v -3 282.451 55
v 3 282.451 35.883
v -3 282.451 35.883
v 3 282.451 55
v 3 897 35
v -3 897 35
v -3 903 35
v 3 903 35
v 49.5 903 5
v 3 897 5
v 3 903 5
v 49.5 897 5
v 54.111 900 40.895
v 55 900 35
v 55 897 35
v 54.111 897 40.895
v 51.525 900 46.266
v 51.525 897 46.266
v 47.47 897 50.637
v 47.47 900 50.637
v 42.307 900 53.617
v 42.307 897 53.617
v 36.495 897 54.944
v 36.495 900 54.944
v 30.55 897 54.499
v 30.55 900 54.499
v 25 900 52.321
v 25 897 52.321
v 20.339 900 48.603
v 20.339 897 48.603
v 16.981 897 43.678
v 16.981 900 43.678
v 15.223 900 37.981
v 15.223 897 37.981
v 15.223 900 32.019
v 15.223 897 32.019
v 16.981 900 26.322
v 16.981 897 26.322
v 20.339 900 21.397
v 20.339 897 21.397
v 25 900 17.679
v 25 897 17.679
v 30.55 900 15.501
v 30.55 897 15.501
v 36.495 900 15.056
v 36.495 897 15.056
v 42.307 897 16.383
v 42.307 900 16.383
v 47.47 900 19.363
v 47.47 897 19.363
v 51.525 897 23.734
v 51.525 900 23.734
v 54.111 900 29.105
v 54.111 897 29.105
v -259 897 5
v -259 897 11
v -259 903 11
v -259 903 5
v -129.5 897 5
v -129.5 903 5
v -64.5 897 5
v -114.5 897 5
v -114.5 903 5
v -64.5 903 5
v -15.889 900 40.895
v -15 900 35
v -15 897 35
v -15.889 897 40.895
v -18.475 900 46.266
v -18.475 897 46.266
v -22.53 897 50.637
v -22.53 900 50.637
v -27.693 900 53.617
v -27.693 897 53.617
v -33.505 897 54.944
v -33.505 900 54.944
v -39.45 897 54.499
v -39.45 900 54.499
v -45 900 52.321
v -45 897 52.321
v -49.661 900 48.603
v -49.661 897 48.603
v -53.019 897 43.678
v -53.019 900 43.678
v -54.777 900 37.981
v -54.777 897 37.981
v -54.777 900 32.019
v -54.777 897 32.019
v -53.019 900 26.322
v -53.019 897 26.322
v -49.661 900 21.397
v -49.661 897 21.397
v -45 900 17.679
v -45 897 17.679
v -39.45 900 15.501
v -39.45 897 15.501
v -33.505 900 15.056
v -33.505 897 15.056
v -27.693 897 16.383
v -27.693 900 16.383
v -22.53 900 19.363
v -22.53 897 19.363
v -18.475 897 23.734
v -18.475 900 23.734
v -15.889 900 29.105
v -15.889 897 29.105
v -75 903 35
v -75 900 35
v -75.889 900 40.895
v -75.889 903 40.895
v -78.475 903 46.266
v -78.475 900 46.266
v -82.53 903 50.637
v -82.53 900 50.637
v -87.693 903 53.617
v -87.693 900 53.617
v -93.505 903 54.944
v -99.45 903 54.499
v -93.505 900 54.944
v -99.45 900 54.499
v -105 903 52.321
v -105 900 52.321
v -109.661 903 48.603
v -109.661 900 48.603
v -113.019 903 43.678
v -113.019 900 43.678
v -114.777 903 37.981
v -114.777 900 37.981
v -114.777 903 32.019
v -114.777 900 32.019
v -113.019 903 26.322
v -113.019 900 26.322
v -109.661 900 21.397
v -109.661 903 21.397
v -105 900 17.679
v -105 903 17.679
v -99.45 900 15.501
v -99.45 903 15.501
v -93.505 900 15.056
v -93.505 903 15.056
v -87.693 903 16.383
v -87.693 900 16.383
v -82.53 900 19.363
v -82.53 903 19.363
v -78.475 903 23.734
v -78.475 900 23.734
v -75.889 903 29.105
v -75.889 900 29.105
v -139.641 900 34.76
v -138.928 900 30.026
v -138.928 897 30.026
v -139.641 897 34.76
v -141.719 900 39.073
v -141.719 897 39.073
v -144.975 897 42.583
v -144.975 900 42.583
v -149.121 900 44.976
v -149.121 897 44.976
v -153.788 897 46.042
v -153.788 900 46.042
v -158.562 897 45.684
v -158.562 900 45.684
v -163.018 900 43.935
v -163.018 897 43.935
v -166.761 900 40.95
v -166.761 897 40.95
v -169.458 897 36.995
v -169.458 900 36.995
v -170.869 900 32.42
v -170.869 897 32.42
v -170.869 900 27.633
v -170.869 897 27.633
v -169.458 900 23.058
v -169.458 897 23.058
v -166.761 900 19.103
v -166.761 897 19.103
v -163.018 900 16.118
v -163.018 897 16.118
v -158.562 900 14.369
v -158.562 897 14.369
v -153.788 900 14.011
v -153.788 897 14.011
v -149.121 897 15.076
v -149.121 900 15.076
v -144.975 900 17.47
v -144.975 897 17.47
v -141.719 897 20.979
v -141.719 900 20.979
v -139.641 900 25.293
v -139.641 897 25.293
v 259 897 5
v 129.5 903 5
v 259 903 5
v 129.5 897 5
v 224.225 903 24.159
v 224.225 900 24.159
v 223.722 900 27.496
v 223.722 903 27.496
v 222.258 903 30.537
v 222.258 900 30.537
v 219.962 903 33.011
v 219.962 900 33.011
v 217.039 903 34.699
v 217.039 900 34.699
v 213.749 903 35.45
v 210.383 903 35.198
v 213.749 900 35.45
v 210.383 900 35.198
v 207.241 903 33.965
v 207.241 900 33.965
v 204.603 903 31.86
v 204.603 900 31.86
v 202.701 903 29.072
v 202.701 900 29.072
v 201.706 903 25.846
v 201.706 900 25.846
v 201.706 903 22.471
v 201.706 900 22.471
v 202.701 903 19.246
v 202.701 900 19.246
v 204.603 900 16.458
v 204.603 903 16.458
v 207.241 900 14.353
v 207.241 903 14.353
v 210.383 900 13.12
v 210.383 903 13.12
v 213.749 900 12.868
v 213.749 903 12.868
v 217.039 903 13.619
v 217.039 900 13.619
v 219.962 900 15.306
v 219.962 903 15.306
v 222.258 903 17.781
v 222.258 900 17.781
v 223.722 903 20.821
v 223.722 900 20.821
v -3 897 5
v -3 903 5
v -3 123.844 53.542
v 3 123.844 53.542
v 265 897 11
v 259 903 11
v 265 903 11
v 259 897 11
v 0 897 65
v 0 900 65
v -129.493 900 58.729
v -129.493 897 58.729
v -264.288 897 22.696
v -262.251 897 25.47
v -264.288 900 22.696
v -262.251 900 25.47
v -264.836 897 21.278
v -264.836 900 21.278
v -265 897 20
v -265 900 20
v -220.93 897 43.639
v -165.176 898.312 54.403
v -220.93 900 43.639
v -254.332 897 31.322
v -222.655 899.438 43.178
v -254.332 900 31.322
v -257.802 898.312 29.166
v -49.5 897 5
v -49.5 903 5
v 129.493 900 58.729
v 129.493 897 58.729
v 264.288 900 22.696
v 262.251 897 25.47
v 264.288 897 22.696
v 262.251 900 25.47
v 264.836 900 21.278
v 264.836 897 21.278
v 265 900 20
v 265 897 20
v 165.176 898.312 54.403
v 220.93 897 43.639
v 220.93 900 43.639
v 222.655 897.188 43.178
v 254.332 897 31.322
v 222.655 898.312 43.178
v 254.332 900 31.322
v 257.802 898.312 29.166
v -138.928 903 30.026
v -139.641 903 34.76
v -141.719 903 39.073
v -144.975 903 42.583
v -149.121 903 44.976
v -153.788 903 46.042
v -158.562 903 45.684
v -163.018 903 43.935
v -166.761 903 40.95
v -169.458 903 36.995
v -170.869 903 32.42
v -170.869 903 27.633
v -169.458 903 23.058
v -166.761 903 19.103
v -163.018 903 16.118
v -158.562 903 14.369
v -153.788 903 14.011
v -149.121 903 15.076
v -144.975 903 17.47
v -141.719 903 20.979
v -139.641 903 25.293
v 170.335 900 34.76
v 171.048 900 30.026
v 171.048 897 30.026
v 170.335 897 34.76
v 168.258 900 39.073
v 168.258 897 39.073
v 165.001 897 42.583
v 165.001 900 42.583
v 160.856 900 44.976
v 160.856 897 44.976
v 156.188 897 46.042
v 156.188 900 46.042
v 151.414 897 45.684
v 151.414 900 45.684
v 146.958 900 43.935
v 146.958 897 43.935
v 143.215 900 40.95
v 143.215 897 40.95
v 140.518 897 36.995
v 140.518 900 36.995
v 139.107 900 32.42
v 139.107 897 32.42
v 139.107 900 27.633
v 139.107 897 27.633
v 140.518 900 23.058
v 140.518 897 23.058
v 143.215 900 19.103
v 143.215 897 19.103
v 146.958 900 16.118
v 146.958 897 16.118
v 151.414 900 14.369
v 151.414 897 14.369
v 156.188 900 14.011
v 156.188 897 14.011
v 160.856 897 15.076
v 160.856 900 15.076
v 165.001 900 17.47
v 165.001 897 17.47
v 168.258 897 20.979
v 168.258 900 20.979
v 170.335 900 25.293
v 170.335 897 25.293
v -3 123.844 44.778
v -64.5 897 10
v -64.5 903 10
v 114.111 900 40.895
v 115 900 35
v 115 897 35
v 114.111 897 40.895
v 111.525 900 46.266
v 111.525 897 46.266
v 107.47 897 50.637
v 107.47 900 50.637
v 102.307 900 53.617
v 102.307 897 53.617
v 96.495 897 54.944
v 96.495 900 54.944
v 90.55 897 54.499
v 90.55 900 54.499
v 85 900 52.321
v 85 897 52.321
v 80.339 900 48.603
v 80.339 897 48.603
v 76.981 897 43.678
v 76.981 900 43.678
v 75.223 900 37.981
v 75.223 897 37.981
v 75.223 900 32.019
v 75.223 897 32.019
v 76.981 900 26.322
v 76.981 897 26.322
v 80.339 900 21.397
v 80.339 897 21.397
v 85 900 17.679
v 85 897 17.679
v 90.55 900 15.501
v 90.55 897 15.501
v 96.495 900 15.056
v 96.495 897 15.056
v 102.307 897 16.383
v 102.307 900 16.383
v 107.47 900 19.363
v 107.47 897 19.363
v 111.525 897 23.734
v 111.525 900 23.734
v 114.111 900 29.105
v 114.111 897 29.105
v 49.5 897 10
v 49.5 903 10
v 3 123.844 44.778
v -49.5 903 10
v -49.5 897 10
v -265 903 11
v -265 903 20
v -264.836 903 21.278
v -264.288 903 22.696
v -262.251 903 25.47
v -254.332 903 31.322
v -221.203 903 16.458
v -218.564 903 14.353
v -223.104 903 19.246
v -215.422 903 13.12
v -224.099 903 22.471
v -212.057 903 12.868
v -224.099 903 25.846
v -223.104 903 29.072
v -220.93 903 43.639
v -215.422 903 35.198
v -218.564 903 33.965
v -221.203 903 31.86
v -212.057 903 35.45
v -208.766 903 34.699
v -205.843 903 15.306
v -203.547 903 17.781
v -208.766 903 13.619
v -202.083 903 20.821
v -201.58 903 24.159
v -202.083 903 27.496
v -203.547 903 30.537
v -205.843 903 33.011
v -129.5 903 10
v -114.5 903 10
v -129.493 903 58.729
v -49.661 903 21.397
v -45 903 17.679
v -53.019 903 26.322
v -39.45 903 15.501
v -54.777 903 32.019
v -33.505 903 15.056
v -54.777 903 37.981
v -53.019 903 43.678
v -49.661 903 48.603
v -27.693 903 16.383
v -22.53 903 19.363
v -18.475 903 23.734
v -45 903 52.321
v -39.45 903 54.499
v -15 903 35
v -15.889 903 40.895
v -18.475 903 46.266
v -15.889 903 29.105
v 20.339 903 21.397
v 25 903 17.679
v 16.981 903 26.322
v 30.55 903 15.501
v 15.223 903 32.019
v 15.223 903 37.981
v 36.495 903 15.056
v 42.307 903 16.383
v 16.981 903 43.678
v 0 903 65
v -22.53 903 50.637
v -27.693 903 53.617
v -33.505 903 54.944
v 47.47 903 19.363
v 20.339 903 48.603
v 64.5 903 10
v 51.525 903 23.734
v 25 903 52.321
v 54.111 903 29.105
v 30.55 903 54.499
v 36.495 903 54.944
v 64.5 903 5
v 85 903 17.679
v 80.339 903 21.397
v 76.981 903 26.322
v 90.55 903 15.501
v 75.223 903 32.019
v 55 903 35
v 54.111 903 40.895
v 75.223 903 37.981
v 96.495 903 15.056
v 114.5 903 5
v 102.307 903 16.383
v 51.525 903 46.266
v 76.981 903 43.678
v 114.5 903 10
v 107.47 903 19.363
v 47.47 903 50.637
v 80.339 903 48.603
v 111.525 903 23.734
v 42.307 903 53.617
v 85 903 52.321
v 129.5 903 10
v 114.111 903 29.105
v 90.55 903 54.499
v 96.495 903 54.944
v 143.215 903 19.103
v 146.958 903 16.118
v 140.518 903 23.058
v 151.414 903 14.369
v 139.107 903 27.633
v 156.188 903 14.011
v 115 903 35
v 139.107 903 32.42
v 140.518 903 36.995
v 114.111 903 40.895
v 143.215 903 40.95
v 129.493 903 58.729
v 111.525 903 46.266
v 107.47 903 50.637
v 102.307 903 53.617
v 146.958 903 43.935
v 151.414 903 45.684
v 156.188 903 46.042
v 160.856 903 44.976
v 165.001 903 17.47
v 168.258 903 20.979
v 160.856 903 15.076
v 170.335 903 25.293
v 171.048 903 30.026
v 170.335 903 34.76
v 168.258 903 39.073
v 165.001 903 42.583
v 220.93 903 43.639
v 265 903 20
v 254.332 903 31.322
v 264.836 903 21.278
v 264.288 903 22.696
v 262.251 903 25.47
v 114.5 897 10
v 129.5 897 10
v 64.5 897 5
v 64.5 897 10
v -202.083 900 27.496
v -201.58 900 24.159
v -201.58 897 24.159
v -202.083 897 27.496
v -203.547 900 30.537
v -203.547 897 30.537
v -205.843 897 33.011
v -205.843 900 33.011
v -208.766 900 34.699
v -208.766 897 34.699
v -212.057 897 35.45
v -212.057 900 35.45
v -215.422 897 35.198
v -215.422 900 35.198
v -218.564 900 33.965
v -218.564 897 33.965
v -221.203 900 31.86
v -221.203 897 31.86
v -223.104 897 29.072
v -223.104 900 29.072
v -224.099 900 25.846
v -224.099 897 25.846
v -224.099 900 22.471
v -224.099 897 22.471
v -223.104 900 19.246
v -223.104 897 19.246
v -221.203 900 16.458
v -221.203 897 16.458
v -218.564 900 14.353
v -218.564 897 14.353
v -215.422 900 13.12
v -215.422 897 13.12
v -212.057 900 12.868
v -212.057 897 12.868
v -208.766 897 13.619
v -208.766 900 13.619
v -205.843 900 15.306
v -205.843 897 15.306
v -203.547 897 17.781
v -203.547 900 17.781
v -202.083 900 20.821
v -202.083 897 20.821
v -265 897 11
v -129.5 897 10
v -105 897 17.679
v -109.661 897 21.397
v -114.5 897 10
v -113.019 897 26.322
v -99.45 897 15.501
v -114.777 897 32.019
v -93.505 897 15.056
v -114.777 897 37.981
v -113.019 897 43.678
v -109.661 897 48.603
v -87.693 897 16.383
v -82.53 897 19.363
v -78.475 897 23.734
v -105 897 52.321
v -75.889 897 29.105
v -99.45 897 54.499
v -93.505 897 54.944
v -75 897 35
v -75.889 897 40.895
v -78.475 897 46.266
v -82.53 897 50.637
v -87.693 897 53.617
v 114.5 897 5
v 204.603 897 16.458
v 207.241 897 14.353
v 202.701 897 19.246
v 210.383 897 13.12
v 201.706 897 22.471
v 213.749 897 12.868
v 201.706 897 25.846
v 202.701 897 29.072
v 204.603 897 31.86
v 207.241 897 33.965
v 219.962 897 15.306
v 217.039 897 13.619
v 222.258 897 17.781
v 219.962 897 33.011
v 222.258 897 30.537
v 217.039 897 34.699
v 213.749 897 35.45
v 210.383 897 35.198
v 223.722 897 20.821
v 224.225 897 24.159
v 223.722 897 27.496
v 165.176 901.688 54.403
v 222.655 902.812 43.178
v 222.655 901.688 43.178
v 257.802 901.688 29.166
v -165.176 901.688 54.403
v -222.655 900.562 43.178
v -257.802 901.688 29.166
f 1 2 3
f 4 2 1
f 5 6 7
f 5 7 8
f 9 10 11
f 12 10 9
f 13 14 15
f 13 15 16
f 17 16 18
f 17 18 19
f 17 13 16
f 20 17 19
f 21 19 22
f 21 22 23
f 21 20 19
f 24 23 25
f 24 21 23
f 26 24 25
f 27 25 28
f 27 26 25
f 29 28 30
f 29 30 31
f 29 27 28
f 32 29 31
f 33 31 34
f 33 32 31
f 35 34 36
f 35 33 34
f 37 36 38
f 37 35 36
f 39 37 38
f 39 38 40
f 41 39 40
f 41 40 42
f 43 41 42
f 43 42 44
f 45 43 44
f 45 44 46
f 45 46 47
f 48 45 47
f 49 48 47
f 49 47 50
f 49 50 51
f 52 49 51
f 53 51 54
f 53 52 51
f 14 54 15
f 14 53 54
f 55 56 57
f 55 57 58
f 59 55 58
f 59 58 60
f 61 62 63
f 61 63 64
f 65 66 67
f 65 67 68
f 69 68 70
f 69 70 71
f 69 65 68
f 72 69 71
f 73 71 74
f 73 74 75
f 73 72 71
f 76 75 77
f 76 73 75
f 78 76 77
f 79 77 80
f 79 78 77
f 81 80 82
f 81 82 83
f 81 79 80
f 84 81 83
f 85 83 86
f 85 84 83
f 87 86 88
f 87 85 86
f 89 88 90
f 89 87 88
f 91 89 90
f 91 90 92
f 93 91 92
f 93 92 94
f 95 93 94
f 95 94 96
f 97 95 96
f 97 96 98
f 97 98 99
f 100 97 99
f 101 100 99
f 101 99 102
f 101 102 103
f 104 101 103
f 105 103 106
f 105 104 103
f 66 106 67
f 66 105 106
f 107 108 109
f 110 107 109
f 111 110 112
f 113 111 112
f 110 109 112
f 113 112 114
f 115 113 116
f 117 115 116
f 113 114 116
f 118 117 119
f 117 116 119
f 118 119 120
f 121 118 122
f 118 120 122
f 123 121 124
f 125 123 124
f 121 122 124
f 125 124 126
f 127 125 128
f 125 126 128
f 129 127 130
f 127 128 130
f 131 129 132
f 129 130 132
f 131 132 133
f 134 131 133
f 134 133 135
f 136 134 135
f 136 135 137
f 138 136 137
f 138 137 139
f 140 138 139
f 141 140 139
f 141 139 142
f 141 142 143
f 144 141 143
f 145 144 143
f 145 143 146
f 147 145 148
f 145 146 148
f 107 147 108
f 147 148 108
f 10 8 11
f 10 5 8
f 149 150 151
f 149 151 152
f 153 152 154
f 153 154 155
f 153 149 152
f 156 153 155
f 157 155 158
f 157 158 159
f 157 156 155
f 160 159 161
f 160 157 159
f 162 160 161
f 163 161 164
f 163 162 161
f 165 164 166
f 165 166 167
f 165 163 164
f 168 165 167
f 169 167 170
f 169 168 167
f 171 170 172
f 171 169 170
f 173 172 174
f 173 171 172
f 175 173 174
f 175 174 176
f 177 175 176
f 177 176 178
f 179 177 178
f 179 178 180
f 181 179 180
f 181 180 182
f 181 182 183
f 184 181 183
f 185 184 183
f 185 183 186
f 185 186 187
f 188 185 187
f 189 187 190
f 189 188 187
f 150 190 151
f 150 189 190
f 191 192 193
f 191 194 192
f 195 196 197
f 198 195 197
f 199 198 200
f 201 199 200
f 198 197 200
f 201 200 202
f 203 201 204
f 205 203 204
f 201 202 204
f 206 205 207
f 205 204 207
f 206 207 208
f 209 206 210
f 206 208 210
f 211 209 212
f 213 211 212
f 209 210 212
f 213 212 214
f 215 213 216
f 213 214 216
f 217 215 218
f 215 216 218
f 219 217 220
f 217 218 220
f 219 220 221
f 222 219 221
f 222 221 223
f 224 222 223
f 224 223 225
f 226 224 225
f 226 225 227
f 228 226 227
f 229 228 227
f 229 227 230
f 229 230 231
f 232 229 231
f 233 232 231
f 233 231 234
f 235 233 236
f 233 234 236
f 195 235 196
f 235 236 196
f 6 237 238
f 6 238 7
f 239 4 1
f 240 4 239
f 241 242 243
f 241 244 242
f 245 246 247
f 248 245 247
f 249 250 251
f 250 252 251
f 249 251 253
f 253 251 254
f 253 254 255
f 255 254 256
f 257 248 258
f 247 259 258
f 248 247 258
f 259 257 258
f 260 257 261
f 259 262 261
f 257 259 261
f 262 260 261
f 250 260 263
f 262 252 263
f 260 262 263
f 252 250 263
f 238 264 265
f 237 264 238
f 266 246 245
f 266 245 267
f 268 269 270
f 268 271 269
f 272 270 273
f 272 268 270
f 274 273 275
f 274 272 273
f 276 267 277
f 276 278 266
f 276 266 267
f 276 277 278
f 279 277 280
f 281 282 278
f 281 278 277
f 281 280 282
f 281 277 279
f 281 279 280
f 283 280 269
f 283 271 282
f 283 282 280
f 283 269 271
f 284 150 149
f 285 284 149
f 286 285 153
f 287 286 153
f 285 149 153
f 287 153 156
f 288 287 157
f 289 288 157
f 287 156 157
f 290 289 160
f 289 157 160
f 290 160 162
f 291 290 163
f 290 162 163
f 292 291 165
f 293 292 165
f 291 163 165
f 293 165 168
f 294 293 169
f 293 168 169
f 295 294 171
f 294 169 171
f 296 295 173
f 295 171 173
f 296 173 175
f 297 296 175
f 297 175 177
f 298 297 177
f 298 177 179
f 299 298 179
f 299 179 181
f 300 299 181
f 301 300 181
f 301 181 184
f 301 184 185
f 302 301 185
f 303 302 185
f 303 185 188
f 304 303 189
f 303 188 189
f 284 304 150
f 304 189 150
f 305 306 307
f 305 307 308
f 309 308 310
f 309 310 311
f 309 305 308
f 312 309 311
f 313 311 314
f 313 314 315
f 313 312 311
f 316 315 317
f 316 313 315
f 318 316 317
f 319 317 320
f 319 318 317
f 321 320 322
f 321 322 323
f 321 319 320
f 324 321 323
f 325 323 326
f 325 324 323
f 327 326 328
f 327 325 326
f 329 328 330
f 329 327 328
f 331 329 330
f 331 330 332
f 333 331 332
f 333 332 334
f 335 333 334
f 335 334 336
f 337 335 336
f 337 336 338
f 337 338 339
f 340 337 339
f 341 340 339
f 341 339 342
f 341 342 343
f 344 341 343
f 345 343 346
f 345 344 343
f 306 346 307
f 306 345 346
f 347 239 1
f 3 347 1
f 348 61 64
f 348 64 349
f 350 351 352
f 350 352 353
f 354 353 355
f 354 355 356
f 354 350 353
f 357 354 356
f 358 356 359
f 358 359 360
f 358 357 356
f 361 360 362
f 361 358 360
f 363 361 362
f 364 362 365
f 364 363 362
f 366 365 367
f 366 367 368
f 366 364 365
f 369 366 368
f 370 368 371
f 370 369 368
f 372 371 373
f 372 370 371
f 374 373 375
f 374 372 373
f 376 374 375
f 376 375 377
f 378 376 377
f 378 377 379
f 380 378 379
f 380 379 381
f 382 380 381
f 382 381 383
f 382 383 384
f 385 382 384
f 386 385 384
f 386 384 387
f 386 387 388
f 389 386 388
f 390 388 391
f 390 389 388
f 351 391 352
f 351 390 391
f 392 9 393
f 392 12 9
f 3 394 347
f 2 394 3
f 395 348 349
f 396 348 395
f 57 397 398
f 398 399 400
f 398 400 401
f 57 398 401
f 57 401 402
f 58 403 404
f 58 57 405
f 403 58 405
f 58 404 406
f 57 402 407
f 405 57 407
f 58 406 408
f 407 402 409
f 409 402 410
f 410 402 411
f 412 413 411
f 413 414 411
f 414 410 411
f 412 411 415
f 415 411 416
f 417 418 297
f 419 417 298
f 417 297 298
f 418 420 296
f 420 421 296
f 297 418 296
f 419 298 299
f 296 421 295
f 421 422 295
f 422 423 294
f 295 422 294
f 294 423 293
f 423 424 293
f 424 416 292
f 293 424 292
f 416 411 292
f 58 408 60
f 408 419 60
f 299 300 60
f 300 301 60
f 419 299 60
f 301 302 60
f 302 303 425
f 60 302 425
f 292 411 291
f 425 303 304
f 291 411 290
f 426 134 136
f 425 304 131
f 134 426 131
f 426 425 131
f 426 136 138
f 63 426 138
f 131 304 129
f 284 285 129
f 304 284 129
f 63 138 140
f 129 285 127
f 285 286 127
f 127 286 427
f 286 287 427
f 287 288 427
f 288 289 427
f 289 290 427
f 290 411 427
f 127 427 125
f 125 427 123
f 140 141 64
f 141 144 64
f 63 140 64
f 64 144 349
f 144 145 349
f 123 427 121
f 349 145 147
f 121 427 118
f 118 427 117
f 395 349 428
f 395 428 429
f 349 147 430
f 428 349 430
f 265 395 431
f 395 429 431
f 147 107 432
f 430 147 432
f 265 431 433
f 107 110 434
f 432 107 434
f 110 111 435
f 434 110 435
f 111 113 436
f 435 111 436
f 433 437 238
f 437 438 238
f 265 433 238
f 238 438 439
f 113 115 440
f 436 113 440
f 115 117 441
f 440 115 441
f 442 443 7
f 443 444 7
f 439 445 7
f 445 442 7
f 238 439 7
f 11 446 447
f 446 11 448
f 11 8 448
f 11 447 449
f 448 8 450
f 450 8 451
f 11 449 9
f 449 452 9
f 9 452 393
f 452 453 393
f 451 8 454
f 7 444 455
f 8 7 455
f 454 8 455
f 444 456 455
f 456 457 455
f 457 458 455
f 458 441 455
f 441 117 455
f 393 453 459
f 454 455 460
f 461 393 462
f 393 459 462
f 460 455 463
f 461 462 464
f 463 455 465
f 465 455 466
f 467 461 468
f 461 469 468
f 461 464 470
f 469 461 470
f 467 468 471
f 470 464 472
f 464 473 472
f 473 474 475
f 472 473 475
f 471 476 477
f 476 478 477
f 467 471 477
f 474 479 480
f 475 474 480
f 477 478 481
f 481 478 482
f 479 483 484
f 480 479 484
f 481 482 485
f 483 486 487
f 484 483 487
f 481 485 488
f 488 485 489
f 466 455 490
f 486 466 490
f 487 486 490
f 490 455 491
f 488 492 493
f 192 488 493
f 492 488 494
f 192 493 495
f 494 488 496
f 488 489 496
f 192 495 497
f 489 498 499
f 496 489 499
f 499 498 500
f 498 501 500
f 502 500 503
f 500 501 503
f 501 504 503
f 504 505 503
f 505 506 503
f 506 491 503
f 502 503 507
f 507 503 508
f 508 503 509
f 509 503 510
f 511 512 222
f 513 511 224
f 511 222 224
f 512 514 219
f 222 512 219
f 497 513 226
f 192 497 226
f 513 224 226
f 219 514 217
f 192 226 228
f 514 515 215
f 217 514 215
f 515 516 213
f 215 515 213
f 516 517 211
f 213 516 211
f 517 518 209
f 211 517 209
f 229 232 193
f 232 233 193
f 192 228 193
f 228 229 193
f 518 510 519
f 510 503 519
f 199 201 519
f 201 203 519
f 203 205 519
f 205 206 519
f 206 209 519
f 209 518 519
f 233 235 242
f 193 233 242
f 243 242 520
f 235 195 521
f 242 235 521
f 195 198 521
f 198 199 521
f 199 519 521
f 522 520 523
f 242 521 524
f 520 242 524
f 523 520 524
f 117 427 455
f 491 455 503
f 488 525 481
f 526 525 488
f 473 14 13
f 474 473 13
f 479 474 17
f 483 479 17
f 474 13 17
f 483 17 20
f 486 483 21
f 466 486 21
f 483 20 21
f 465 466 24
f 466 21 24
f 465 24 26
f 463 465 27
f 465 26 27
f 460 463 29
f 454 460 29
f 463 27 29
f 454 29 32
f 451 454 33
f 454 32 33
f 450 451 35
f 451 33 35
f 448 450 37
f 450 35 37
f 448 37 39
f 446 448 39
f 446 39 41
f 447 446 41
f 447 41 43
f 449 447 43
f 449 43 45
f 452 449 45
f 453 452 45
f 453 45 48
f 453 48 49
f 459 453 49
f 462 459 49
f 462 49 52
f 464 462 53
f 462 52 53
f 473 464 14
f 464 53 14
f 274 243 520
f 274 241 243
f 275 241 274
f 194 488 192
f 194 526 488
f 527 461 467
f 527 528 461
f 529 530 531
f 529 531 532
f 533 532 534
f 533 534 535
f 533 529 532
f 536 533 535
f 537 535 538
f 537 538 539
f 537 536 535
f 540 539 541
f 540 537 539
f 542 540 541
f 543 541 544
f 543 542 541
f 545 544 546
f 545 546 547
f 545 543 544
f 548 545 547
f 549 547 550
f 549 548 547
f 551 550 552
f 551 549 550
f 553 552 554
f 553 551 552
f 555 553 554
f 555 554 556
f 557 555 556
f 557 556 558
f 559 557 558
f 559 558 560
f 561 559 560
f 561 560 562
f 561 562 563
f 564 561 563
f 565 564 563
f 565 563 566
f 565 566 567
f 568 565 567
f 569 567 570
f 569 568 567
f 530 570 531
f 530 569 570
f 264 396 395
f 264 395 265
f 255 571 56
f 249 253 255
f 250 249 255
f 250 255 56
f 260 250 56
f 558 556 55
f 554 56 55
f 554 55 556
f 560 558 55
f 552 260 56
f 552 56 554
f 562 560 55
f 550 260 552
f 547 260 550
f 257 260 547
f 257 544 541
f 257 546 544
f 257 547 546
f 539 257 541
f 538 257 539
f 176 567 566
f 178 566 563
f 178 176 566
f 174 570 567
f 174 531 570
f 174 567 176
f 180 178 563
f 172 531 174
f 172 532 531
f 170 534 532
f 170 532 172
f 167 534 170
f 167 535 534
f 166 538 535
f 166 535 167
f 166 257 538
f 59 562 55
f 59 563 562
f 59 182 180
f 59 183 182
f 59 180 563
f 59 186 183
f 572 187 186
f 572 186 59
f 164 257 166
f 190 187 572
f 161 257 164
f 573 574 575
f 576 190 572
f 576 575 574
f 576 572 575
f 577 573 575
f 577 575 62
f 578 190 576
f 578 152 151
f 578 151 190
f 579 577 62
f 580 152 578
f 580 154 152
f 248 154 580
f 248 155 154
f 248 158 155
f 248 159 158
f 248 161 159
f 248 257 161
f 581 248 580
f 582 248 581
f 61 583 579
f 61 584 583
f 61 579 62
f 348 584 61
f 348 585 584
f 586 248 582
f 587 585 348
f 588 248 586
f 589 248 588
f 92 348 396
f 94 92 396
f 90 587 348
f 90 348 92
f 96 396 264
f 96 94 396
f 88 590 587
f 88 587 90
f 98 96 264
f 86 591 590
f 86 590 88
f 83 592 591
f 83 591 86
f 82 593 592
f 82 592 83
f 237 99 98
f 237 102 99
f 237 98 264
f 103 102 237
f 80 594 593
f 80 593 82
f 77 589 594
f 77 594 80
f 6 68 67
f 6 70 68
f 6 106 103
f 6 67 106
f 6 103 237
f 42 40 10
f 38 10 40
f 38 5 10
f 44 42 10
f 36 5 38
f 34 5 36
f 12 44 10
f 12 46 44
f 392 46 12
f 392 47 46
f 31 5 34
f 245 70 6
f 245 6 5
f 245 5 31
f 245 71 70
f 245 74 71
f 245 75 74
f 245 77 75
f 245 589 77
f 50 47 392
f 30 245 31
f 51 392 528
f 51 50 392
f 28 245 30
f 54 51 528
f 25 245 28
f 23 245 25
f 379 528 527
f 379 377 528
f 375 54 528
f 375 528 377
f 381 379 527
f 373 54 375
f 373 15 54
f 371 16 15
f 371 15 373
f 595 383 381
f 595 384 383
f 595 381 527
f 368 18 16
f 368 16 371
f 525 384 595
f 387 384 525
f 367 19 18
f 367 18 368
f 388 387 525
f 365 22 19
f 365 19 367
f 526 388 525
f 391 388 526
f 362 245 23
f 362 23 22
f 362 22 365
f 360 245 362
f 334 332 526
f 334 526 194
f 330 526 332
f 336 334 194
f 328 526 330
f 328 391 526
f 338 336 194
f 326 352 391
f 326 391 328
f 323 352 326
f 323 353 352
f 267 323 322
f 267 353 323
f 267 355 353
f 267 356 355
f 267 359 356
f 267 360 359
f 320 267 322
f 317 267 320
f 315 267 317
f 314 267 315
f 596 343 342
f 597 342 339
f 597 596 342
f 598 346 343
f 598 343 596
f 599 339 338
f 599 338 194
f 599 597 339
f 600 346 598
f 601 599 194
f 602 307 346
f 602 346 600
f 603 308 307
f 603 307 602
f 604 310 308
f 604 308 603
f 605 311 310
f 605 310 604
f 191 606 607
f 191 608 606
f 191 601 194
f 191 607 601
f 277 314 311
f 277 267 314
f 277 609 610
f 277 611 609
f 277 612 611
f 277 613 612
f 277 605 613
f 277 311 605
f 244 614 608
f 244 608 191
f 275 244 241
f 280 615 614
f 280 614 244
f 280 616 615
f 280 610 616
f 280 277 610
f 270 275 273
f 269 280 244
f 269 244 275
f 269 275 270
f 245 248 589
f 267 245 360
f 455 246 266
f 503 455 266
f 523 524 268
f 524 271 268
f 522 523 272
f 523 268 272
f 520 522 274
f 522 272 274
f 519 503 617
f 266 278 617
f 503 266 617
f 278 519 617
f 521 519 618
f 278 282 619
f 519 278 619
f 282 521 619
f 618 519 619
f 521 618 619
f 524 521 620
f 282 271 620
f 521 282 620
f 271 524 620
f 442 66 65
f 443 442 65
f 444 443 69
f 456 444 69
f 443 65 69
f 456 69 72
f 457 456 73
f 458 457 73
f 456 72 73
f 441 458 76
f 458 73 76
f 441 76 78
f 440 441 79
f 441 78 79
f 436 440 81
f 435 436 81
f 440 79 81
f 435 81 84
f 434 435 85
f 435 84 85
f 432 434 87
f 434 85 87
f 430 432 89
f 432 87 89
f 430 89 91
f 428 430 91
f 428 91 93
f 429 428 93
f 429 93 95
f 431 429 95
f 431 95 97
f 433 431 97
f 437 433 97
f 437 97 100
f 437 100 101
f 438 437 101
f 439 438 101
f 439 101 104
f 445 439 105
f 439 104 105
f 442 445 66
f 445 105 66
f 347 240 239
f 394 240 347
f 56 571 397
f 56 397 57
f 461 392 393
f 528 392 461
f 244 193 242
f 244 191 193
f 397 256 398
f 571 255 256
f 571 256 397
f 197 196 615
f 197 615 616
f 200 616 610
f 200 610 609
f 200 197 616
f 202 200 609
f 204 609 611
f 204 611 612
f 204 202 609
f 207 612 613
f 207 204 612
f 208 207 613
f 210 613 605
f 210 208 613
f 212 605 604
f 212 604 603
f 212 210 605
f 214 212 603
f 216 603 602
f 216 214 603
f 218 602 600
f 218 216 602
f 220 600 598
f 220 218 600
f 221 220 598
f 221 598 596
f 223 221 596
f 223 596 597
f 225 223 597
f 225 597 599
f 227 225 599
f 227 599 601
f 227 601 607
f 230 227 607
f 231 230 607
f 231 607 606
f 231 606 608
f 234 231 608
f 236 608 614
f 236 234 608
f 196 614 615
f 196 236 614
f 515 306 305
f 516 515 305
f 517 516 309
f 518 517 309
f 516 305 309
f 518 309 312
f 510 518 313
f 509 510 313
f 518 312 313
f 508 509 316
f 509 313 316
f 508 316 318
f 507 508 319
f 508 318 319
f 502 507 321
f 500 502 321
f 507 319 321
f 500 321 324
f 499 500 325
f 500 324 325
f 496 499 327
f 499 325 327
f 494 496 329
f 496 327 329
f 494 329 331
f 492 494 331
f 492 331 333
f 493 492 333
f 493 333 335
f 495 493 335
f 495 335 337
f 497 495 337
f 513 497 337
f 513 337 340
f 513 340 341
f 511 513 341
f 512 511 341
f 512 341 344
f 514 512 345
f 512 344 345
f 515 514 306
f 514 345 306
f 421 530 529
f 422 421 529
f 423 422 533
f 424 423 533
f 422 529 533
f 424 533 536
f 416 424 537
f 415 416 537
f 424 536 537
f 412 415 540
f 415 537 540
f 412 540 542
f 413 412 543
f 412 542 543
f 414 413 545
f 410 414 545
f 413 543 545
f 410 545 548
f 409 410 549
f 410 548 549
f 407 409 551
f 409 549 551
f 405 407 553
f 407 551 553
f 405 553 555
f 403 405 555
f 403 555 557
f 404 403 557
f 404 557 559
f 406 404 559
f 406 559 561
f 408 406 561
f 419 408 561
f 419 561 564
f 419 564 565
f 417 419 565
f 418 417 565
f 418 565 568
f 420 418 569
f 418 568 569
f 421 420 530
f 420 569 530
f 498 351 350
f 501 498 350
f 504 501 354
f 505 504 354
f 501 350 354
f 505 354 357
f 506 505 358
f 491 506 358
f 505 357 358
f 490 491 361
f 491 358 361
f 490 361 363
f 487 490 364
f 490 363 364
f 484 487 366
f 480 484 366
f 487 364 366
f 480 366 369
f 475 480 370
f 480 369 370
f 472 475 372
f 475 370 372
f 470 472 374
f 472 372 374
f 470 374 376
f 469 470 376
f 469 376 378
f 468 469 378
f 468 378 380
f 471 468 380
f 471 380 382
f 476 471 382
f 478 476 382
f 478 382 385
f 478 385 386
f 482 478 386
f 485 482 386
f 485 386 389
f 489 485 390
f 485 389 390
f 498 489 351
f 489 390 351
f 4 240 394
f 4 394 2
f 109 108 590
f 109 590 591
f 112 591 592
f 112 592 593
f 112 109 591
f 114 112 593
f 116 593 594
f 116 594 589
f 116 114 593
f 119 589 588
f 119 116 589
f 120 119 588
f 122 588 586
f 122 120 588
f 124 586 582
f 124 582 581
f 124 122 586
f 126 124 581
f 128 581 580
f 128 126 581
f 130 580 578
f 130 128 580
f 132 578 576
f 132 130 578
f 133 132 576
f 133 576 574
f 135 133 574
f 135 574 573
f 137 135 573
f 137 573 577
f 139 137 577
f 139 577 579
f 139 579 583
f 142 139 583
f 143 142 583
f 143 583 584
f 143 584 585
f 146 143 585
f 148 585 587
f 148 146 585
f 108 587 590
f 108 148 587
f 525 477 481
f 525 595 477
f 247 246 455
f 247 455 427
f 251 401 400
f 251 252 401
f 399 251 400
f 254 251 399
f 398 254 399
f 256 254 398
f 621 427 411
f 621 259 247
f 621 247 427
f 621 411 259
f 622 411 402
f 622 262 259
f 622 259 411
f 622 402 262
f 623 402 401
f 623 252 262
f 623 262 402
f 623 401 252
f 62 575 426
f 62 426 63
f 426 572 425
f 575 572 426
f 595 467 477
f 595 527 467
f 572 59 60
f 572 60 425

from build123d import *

# Parameters (mm, degrees)
F13_R     = 11.3226827756
F13_R_2   = 16.0602215827
F13_R_3   = 20
F14_DEPTH = 3
F16_DEPTH = 3


# Not quite as in the source:
# - ends of sketch curves that miss each other by under 0.0002 mm in the source are joined
# - the dataset's text gives a spline's control points without its knots; the knots are read off the source's solid


with BuildPart() as f14:
    # F13 (on plane+point) → F14 (new body, symmetric)
    with BuildSketch(Plane.XZ.offset(-900)):
        with BuildLine():
            add(Edge.make_bspline(
                [(0, 65.0000017214), (-16.8132716262, 65.0000017214), (-50.4436594842, 64.3772177187), (-99.3025047051, 61.6918414949), (-137.3620190284, 58.0943852226), (-165.4098100123, 54.4631954875), (-185.0417959114, 51.3800009944), (-203.0635795445, 47.9551169207), (-219.2641655203, 44.2095883028), (-233.4245941815, 40.1700613915), (-245.3115843014, 35.8773618028), (-253.1066747999, 32.1477127494), (-257.9267935516, 29.159352958), (-260.7953195745, 26.9605190172), (-262.8893252044, 24.8705031892), (-264.217468598, 22.9832715337), (-264.8761935592, 21.3845998162), (-265.0000017214, 20.4687501614), (-265.0000017214, 20)],
                knots=[0, 0, 0, 0, 0.125, 0.25, 0.375, 0.4375, 0.5, 0.5625, 0.625, 0.6875, 0.75, 0.8125, 0.84375, 0.875, 0.90625, 0.9375, 0.96875, 1, 1, 1, 1], degree=3))
            Line((-265.0000017214, 20), (-265.0000017214, 14))
            Line((-265.0000017214, 14), (-265.0000017214, 11))
            Line((-265.0000017214, 11), (-259.0000017214, 11))
            Line((-259.0000017214, 11), (-259.0000017214, 5))
            Line((-259.0000017214, 5), (-129.5000008607, 5))
            Line((-129.5000008607, 5), (-129.5000008607, 10))
            Line((-129.5000008607, 10), (-114.5000008607, 10))
            Line((-114.5000008607, 10), (-114.5000008607, 5))
            Line((-114.5000008607, 5), (-64.5000008607, 5))
            Line((-64.5000008607, 5), (-64.5000008607, 10))
            Line((-64.5000008607, 10), (-49.5000008607, 10))
            Line((-49.5000008607, 10), (-49.5000008607, 5))
            Line((-49.5000008607, 5), (-3, 5))
            Line((-3, 5), (-3, 35))
            Line((-3, 35), (0, 35))
            Line((0, 35), (3, 35))
            Line((3, 35), (3, 5))
            Line((3, 5), (49.5000008607, 5))
            Line((49.5000008607, 5), (49.5000008607, 10))
            Line((49.5000008607, 10), (64.5000008607, 10))
            Line((64.5000008607, 10), (64.5000008607, 5))
            Line((64.5000008607, 5), (114.5000008607, 5))
            Line((114.5000008607, 5), (114.5000008607, 10))
            Line((114.5000008607, 10), (129.5000008607, 10))
            Line((129.5000008607, 10), (129.5000008607, 5))
            Line((129.5000008607, 5), (259.0000017214, 5))
            Line((259.0000017214, 5), (259.0000017214, 11))
            Line((259.0000017214, 11), (265.0000017214, 11))
            Line((265.0000017214, 11), (265.0000017214, 14))
            Line((265.0000017214, 14), (265.0000017214, 20))
            add(Edge.make_bspline(
                [(0, 65.0000017214), (16.8132716049, 65), (50.4436594217, 64.377215998), (99.3025045792, 61.6918397777), (137.3620188431, 58.0943835108), (165.4098097701, 54.4631937831), (185.0417956199, 51.3799992976), (203.0635791939, 47.9551152349), (219.2641650964, 44.2095866337), (233.4245936626, 40.1700597488), (245.3115836539, 35.8773602052), (253.1066739993, 32.1477112211), (257.9267925836, 29.1593515313), (260.7953184537, 26.9605177048), (262.8893239024, 24.8705020511), (264.217467098, 22.9832706618), (264.876191886, 21.3845993314), (265, 20.46875), (265.0000017214, 20)],
                knots=[0, 0, 0, 0, 0.125, 0.25, 0.375, 0.4375, 0.5, 0.5625, 0.625, 0.6875, 0.75, 0.8125, 0.84375, 0.875, 0.90625, 0.9375, 0.96875, 1, 1, 1, 1], degree=3))
        make_face()
        with Locations((-212.9026800394, 24.1589043289)):
            Circle(F13_R, mode=Mode.SUBTRACT)
        with Locations((-154.9880802631, 30.0264377147)):
            Circle(F13_R_2, mode=Mode.SUBTRACT)
        with Locations((-95, 35)):
            Circle(F13_R_3, mode=Mode.SUBTRACT)
        with Locations((-35, 35)):
            Circle(F13_R_3, mode=Mode.SUBTRACT)
        with Locations((35, 35)):
            Circle(F13_R_3, mode=Mode.SUBTRACT)
        with Locations((95, 35)):
            Circle(F13_R_3, mode=Mode.SUBTRACT)
        with Locations((212.9026800394, 24.1589043289)):
            Circle(F13_R, mode=Mode.SUBTRACT)
        with Locations((154.9880802631, 30.0264377147)):
            Circle(F13_R_2, mode=Mode.SUBTRACT)
    extrude(amount=F14_DEPTH, both=True)


with BuildPart() as f16:
    # F15 (on Right) → F16 (new body, symmetric)
    with BuildSketch(Plane.YZ):
        Polygon((123.8436113754, 53.5422320686), (123.8436113754, 44.7781579091), (282.4514806271, 35.8825288713), (282.4514806271, 55.0000010676), align=None)
    extrude(amount=F16_DEPTH, both=True)


solid = Compound([f14.part, f16.part])
